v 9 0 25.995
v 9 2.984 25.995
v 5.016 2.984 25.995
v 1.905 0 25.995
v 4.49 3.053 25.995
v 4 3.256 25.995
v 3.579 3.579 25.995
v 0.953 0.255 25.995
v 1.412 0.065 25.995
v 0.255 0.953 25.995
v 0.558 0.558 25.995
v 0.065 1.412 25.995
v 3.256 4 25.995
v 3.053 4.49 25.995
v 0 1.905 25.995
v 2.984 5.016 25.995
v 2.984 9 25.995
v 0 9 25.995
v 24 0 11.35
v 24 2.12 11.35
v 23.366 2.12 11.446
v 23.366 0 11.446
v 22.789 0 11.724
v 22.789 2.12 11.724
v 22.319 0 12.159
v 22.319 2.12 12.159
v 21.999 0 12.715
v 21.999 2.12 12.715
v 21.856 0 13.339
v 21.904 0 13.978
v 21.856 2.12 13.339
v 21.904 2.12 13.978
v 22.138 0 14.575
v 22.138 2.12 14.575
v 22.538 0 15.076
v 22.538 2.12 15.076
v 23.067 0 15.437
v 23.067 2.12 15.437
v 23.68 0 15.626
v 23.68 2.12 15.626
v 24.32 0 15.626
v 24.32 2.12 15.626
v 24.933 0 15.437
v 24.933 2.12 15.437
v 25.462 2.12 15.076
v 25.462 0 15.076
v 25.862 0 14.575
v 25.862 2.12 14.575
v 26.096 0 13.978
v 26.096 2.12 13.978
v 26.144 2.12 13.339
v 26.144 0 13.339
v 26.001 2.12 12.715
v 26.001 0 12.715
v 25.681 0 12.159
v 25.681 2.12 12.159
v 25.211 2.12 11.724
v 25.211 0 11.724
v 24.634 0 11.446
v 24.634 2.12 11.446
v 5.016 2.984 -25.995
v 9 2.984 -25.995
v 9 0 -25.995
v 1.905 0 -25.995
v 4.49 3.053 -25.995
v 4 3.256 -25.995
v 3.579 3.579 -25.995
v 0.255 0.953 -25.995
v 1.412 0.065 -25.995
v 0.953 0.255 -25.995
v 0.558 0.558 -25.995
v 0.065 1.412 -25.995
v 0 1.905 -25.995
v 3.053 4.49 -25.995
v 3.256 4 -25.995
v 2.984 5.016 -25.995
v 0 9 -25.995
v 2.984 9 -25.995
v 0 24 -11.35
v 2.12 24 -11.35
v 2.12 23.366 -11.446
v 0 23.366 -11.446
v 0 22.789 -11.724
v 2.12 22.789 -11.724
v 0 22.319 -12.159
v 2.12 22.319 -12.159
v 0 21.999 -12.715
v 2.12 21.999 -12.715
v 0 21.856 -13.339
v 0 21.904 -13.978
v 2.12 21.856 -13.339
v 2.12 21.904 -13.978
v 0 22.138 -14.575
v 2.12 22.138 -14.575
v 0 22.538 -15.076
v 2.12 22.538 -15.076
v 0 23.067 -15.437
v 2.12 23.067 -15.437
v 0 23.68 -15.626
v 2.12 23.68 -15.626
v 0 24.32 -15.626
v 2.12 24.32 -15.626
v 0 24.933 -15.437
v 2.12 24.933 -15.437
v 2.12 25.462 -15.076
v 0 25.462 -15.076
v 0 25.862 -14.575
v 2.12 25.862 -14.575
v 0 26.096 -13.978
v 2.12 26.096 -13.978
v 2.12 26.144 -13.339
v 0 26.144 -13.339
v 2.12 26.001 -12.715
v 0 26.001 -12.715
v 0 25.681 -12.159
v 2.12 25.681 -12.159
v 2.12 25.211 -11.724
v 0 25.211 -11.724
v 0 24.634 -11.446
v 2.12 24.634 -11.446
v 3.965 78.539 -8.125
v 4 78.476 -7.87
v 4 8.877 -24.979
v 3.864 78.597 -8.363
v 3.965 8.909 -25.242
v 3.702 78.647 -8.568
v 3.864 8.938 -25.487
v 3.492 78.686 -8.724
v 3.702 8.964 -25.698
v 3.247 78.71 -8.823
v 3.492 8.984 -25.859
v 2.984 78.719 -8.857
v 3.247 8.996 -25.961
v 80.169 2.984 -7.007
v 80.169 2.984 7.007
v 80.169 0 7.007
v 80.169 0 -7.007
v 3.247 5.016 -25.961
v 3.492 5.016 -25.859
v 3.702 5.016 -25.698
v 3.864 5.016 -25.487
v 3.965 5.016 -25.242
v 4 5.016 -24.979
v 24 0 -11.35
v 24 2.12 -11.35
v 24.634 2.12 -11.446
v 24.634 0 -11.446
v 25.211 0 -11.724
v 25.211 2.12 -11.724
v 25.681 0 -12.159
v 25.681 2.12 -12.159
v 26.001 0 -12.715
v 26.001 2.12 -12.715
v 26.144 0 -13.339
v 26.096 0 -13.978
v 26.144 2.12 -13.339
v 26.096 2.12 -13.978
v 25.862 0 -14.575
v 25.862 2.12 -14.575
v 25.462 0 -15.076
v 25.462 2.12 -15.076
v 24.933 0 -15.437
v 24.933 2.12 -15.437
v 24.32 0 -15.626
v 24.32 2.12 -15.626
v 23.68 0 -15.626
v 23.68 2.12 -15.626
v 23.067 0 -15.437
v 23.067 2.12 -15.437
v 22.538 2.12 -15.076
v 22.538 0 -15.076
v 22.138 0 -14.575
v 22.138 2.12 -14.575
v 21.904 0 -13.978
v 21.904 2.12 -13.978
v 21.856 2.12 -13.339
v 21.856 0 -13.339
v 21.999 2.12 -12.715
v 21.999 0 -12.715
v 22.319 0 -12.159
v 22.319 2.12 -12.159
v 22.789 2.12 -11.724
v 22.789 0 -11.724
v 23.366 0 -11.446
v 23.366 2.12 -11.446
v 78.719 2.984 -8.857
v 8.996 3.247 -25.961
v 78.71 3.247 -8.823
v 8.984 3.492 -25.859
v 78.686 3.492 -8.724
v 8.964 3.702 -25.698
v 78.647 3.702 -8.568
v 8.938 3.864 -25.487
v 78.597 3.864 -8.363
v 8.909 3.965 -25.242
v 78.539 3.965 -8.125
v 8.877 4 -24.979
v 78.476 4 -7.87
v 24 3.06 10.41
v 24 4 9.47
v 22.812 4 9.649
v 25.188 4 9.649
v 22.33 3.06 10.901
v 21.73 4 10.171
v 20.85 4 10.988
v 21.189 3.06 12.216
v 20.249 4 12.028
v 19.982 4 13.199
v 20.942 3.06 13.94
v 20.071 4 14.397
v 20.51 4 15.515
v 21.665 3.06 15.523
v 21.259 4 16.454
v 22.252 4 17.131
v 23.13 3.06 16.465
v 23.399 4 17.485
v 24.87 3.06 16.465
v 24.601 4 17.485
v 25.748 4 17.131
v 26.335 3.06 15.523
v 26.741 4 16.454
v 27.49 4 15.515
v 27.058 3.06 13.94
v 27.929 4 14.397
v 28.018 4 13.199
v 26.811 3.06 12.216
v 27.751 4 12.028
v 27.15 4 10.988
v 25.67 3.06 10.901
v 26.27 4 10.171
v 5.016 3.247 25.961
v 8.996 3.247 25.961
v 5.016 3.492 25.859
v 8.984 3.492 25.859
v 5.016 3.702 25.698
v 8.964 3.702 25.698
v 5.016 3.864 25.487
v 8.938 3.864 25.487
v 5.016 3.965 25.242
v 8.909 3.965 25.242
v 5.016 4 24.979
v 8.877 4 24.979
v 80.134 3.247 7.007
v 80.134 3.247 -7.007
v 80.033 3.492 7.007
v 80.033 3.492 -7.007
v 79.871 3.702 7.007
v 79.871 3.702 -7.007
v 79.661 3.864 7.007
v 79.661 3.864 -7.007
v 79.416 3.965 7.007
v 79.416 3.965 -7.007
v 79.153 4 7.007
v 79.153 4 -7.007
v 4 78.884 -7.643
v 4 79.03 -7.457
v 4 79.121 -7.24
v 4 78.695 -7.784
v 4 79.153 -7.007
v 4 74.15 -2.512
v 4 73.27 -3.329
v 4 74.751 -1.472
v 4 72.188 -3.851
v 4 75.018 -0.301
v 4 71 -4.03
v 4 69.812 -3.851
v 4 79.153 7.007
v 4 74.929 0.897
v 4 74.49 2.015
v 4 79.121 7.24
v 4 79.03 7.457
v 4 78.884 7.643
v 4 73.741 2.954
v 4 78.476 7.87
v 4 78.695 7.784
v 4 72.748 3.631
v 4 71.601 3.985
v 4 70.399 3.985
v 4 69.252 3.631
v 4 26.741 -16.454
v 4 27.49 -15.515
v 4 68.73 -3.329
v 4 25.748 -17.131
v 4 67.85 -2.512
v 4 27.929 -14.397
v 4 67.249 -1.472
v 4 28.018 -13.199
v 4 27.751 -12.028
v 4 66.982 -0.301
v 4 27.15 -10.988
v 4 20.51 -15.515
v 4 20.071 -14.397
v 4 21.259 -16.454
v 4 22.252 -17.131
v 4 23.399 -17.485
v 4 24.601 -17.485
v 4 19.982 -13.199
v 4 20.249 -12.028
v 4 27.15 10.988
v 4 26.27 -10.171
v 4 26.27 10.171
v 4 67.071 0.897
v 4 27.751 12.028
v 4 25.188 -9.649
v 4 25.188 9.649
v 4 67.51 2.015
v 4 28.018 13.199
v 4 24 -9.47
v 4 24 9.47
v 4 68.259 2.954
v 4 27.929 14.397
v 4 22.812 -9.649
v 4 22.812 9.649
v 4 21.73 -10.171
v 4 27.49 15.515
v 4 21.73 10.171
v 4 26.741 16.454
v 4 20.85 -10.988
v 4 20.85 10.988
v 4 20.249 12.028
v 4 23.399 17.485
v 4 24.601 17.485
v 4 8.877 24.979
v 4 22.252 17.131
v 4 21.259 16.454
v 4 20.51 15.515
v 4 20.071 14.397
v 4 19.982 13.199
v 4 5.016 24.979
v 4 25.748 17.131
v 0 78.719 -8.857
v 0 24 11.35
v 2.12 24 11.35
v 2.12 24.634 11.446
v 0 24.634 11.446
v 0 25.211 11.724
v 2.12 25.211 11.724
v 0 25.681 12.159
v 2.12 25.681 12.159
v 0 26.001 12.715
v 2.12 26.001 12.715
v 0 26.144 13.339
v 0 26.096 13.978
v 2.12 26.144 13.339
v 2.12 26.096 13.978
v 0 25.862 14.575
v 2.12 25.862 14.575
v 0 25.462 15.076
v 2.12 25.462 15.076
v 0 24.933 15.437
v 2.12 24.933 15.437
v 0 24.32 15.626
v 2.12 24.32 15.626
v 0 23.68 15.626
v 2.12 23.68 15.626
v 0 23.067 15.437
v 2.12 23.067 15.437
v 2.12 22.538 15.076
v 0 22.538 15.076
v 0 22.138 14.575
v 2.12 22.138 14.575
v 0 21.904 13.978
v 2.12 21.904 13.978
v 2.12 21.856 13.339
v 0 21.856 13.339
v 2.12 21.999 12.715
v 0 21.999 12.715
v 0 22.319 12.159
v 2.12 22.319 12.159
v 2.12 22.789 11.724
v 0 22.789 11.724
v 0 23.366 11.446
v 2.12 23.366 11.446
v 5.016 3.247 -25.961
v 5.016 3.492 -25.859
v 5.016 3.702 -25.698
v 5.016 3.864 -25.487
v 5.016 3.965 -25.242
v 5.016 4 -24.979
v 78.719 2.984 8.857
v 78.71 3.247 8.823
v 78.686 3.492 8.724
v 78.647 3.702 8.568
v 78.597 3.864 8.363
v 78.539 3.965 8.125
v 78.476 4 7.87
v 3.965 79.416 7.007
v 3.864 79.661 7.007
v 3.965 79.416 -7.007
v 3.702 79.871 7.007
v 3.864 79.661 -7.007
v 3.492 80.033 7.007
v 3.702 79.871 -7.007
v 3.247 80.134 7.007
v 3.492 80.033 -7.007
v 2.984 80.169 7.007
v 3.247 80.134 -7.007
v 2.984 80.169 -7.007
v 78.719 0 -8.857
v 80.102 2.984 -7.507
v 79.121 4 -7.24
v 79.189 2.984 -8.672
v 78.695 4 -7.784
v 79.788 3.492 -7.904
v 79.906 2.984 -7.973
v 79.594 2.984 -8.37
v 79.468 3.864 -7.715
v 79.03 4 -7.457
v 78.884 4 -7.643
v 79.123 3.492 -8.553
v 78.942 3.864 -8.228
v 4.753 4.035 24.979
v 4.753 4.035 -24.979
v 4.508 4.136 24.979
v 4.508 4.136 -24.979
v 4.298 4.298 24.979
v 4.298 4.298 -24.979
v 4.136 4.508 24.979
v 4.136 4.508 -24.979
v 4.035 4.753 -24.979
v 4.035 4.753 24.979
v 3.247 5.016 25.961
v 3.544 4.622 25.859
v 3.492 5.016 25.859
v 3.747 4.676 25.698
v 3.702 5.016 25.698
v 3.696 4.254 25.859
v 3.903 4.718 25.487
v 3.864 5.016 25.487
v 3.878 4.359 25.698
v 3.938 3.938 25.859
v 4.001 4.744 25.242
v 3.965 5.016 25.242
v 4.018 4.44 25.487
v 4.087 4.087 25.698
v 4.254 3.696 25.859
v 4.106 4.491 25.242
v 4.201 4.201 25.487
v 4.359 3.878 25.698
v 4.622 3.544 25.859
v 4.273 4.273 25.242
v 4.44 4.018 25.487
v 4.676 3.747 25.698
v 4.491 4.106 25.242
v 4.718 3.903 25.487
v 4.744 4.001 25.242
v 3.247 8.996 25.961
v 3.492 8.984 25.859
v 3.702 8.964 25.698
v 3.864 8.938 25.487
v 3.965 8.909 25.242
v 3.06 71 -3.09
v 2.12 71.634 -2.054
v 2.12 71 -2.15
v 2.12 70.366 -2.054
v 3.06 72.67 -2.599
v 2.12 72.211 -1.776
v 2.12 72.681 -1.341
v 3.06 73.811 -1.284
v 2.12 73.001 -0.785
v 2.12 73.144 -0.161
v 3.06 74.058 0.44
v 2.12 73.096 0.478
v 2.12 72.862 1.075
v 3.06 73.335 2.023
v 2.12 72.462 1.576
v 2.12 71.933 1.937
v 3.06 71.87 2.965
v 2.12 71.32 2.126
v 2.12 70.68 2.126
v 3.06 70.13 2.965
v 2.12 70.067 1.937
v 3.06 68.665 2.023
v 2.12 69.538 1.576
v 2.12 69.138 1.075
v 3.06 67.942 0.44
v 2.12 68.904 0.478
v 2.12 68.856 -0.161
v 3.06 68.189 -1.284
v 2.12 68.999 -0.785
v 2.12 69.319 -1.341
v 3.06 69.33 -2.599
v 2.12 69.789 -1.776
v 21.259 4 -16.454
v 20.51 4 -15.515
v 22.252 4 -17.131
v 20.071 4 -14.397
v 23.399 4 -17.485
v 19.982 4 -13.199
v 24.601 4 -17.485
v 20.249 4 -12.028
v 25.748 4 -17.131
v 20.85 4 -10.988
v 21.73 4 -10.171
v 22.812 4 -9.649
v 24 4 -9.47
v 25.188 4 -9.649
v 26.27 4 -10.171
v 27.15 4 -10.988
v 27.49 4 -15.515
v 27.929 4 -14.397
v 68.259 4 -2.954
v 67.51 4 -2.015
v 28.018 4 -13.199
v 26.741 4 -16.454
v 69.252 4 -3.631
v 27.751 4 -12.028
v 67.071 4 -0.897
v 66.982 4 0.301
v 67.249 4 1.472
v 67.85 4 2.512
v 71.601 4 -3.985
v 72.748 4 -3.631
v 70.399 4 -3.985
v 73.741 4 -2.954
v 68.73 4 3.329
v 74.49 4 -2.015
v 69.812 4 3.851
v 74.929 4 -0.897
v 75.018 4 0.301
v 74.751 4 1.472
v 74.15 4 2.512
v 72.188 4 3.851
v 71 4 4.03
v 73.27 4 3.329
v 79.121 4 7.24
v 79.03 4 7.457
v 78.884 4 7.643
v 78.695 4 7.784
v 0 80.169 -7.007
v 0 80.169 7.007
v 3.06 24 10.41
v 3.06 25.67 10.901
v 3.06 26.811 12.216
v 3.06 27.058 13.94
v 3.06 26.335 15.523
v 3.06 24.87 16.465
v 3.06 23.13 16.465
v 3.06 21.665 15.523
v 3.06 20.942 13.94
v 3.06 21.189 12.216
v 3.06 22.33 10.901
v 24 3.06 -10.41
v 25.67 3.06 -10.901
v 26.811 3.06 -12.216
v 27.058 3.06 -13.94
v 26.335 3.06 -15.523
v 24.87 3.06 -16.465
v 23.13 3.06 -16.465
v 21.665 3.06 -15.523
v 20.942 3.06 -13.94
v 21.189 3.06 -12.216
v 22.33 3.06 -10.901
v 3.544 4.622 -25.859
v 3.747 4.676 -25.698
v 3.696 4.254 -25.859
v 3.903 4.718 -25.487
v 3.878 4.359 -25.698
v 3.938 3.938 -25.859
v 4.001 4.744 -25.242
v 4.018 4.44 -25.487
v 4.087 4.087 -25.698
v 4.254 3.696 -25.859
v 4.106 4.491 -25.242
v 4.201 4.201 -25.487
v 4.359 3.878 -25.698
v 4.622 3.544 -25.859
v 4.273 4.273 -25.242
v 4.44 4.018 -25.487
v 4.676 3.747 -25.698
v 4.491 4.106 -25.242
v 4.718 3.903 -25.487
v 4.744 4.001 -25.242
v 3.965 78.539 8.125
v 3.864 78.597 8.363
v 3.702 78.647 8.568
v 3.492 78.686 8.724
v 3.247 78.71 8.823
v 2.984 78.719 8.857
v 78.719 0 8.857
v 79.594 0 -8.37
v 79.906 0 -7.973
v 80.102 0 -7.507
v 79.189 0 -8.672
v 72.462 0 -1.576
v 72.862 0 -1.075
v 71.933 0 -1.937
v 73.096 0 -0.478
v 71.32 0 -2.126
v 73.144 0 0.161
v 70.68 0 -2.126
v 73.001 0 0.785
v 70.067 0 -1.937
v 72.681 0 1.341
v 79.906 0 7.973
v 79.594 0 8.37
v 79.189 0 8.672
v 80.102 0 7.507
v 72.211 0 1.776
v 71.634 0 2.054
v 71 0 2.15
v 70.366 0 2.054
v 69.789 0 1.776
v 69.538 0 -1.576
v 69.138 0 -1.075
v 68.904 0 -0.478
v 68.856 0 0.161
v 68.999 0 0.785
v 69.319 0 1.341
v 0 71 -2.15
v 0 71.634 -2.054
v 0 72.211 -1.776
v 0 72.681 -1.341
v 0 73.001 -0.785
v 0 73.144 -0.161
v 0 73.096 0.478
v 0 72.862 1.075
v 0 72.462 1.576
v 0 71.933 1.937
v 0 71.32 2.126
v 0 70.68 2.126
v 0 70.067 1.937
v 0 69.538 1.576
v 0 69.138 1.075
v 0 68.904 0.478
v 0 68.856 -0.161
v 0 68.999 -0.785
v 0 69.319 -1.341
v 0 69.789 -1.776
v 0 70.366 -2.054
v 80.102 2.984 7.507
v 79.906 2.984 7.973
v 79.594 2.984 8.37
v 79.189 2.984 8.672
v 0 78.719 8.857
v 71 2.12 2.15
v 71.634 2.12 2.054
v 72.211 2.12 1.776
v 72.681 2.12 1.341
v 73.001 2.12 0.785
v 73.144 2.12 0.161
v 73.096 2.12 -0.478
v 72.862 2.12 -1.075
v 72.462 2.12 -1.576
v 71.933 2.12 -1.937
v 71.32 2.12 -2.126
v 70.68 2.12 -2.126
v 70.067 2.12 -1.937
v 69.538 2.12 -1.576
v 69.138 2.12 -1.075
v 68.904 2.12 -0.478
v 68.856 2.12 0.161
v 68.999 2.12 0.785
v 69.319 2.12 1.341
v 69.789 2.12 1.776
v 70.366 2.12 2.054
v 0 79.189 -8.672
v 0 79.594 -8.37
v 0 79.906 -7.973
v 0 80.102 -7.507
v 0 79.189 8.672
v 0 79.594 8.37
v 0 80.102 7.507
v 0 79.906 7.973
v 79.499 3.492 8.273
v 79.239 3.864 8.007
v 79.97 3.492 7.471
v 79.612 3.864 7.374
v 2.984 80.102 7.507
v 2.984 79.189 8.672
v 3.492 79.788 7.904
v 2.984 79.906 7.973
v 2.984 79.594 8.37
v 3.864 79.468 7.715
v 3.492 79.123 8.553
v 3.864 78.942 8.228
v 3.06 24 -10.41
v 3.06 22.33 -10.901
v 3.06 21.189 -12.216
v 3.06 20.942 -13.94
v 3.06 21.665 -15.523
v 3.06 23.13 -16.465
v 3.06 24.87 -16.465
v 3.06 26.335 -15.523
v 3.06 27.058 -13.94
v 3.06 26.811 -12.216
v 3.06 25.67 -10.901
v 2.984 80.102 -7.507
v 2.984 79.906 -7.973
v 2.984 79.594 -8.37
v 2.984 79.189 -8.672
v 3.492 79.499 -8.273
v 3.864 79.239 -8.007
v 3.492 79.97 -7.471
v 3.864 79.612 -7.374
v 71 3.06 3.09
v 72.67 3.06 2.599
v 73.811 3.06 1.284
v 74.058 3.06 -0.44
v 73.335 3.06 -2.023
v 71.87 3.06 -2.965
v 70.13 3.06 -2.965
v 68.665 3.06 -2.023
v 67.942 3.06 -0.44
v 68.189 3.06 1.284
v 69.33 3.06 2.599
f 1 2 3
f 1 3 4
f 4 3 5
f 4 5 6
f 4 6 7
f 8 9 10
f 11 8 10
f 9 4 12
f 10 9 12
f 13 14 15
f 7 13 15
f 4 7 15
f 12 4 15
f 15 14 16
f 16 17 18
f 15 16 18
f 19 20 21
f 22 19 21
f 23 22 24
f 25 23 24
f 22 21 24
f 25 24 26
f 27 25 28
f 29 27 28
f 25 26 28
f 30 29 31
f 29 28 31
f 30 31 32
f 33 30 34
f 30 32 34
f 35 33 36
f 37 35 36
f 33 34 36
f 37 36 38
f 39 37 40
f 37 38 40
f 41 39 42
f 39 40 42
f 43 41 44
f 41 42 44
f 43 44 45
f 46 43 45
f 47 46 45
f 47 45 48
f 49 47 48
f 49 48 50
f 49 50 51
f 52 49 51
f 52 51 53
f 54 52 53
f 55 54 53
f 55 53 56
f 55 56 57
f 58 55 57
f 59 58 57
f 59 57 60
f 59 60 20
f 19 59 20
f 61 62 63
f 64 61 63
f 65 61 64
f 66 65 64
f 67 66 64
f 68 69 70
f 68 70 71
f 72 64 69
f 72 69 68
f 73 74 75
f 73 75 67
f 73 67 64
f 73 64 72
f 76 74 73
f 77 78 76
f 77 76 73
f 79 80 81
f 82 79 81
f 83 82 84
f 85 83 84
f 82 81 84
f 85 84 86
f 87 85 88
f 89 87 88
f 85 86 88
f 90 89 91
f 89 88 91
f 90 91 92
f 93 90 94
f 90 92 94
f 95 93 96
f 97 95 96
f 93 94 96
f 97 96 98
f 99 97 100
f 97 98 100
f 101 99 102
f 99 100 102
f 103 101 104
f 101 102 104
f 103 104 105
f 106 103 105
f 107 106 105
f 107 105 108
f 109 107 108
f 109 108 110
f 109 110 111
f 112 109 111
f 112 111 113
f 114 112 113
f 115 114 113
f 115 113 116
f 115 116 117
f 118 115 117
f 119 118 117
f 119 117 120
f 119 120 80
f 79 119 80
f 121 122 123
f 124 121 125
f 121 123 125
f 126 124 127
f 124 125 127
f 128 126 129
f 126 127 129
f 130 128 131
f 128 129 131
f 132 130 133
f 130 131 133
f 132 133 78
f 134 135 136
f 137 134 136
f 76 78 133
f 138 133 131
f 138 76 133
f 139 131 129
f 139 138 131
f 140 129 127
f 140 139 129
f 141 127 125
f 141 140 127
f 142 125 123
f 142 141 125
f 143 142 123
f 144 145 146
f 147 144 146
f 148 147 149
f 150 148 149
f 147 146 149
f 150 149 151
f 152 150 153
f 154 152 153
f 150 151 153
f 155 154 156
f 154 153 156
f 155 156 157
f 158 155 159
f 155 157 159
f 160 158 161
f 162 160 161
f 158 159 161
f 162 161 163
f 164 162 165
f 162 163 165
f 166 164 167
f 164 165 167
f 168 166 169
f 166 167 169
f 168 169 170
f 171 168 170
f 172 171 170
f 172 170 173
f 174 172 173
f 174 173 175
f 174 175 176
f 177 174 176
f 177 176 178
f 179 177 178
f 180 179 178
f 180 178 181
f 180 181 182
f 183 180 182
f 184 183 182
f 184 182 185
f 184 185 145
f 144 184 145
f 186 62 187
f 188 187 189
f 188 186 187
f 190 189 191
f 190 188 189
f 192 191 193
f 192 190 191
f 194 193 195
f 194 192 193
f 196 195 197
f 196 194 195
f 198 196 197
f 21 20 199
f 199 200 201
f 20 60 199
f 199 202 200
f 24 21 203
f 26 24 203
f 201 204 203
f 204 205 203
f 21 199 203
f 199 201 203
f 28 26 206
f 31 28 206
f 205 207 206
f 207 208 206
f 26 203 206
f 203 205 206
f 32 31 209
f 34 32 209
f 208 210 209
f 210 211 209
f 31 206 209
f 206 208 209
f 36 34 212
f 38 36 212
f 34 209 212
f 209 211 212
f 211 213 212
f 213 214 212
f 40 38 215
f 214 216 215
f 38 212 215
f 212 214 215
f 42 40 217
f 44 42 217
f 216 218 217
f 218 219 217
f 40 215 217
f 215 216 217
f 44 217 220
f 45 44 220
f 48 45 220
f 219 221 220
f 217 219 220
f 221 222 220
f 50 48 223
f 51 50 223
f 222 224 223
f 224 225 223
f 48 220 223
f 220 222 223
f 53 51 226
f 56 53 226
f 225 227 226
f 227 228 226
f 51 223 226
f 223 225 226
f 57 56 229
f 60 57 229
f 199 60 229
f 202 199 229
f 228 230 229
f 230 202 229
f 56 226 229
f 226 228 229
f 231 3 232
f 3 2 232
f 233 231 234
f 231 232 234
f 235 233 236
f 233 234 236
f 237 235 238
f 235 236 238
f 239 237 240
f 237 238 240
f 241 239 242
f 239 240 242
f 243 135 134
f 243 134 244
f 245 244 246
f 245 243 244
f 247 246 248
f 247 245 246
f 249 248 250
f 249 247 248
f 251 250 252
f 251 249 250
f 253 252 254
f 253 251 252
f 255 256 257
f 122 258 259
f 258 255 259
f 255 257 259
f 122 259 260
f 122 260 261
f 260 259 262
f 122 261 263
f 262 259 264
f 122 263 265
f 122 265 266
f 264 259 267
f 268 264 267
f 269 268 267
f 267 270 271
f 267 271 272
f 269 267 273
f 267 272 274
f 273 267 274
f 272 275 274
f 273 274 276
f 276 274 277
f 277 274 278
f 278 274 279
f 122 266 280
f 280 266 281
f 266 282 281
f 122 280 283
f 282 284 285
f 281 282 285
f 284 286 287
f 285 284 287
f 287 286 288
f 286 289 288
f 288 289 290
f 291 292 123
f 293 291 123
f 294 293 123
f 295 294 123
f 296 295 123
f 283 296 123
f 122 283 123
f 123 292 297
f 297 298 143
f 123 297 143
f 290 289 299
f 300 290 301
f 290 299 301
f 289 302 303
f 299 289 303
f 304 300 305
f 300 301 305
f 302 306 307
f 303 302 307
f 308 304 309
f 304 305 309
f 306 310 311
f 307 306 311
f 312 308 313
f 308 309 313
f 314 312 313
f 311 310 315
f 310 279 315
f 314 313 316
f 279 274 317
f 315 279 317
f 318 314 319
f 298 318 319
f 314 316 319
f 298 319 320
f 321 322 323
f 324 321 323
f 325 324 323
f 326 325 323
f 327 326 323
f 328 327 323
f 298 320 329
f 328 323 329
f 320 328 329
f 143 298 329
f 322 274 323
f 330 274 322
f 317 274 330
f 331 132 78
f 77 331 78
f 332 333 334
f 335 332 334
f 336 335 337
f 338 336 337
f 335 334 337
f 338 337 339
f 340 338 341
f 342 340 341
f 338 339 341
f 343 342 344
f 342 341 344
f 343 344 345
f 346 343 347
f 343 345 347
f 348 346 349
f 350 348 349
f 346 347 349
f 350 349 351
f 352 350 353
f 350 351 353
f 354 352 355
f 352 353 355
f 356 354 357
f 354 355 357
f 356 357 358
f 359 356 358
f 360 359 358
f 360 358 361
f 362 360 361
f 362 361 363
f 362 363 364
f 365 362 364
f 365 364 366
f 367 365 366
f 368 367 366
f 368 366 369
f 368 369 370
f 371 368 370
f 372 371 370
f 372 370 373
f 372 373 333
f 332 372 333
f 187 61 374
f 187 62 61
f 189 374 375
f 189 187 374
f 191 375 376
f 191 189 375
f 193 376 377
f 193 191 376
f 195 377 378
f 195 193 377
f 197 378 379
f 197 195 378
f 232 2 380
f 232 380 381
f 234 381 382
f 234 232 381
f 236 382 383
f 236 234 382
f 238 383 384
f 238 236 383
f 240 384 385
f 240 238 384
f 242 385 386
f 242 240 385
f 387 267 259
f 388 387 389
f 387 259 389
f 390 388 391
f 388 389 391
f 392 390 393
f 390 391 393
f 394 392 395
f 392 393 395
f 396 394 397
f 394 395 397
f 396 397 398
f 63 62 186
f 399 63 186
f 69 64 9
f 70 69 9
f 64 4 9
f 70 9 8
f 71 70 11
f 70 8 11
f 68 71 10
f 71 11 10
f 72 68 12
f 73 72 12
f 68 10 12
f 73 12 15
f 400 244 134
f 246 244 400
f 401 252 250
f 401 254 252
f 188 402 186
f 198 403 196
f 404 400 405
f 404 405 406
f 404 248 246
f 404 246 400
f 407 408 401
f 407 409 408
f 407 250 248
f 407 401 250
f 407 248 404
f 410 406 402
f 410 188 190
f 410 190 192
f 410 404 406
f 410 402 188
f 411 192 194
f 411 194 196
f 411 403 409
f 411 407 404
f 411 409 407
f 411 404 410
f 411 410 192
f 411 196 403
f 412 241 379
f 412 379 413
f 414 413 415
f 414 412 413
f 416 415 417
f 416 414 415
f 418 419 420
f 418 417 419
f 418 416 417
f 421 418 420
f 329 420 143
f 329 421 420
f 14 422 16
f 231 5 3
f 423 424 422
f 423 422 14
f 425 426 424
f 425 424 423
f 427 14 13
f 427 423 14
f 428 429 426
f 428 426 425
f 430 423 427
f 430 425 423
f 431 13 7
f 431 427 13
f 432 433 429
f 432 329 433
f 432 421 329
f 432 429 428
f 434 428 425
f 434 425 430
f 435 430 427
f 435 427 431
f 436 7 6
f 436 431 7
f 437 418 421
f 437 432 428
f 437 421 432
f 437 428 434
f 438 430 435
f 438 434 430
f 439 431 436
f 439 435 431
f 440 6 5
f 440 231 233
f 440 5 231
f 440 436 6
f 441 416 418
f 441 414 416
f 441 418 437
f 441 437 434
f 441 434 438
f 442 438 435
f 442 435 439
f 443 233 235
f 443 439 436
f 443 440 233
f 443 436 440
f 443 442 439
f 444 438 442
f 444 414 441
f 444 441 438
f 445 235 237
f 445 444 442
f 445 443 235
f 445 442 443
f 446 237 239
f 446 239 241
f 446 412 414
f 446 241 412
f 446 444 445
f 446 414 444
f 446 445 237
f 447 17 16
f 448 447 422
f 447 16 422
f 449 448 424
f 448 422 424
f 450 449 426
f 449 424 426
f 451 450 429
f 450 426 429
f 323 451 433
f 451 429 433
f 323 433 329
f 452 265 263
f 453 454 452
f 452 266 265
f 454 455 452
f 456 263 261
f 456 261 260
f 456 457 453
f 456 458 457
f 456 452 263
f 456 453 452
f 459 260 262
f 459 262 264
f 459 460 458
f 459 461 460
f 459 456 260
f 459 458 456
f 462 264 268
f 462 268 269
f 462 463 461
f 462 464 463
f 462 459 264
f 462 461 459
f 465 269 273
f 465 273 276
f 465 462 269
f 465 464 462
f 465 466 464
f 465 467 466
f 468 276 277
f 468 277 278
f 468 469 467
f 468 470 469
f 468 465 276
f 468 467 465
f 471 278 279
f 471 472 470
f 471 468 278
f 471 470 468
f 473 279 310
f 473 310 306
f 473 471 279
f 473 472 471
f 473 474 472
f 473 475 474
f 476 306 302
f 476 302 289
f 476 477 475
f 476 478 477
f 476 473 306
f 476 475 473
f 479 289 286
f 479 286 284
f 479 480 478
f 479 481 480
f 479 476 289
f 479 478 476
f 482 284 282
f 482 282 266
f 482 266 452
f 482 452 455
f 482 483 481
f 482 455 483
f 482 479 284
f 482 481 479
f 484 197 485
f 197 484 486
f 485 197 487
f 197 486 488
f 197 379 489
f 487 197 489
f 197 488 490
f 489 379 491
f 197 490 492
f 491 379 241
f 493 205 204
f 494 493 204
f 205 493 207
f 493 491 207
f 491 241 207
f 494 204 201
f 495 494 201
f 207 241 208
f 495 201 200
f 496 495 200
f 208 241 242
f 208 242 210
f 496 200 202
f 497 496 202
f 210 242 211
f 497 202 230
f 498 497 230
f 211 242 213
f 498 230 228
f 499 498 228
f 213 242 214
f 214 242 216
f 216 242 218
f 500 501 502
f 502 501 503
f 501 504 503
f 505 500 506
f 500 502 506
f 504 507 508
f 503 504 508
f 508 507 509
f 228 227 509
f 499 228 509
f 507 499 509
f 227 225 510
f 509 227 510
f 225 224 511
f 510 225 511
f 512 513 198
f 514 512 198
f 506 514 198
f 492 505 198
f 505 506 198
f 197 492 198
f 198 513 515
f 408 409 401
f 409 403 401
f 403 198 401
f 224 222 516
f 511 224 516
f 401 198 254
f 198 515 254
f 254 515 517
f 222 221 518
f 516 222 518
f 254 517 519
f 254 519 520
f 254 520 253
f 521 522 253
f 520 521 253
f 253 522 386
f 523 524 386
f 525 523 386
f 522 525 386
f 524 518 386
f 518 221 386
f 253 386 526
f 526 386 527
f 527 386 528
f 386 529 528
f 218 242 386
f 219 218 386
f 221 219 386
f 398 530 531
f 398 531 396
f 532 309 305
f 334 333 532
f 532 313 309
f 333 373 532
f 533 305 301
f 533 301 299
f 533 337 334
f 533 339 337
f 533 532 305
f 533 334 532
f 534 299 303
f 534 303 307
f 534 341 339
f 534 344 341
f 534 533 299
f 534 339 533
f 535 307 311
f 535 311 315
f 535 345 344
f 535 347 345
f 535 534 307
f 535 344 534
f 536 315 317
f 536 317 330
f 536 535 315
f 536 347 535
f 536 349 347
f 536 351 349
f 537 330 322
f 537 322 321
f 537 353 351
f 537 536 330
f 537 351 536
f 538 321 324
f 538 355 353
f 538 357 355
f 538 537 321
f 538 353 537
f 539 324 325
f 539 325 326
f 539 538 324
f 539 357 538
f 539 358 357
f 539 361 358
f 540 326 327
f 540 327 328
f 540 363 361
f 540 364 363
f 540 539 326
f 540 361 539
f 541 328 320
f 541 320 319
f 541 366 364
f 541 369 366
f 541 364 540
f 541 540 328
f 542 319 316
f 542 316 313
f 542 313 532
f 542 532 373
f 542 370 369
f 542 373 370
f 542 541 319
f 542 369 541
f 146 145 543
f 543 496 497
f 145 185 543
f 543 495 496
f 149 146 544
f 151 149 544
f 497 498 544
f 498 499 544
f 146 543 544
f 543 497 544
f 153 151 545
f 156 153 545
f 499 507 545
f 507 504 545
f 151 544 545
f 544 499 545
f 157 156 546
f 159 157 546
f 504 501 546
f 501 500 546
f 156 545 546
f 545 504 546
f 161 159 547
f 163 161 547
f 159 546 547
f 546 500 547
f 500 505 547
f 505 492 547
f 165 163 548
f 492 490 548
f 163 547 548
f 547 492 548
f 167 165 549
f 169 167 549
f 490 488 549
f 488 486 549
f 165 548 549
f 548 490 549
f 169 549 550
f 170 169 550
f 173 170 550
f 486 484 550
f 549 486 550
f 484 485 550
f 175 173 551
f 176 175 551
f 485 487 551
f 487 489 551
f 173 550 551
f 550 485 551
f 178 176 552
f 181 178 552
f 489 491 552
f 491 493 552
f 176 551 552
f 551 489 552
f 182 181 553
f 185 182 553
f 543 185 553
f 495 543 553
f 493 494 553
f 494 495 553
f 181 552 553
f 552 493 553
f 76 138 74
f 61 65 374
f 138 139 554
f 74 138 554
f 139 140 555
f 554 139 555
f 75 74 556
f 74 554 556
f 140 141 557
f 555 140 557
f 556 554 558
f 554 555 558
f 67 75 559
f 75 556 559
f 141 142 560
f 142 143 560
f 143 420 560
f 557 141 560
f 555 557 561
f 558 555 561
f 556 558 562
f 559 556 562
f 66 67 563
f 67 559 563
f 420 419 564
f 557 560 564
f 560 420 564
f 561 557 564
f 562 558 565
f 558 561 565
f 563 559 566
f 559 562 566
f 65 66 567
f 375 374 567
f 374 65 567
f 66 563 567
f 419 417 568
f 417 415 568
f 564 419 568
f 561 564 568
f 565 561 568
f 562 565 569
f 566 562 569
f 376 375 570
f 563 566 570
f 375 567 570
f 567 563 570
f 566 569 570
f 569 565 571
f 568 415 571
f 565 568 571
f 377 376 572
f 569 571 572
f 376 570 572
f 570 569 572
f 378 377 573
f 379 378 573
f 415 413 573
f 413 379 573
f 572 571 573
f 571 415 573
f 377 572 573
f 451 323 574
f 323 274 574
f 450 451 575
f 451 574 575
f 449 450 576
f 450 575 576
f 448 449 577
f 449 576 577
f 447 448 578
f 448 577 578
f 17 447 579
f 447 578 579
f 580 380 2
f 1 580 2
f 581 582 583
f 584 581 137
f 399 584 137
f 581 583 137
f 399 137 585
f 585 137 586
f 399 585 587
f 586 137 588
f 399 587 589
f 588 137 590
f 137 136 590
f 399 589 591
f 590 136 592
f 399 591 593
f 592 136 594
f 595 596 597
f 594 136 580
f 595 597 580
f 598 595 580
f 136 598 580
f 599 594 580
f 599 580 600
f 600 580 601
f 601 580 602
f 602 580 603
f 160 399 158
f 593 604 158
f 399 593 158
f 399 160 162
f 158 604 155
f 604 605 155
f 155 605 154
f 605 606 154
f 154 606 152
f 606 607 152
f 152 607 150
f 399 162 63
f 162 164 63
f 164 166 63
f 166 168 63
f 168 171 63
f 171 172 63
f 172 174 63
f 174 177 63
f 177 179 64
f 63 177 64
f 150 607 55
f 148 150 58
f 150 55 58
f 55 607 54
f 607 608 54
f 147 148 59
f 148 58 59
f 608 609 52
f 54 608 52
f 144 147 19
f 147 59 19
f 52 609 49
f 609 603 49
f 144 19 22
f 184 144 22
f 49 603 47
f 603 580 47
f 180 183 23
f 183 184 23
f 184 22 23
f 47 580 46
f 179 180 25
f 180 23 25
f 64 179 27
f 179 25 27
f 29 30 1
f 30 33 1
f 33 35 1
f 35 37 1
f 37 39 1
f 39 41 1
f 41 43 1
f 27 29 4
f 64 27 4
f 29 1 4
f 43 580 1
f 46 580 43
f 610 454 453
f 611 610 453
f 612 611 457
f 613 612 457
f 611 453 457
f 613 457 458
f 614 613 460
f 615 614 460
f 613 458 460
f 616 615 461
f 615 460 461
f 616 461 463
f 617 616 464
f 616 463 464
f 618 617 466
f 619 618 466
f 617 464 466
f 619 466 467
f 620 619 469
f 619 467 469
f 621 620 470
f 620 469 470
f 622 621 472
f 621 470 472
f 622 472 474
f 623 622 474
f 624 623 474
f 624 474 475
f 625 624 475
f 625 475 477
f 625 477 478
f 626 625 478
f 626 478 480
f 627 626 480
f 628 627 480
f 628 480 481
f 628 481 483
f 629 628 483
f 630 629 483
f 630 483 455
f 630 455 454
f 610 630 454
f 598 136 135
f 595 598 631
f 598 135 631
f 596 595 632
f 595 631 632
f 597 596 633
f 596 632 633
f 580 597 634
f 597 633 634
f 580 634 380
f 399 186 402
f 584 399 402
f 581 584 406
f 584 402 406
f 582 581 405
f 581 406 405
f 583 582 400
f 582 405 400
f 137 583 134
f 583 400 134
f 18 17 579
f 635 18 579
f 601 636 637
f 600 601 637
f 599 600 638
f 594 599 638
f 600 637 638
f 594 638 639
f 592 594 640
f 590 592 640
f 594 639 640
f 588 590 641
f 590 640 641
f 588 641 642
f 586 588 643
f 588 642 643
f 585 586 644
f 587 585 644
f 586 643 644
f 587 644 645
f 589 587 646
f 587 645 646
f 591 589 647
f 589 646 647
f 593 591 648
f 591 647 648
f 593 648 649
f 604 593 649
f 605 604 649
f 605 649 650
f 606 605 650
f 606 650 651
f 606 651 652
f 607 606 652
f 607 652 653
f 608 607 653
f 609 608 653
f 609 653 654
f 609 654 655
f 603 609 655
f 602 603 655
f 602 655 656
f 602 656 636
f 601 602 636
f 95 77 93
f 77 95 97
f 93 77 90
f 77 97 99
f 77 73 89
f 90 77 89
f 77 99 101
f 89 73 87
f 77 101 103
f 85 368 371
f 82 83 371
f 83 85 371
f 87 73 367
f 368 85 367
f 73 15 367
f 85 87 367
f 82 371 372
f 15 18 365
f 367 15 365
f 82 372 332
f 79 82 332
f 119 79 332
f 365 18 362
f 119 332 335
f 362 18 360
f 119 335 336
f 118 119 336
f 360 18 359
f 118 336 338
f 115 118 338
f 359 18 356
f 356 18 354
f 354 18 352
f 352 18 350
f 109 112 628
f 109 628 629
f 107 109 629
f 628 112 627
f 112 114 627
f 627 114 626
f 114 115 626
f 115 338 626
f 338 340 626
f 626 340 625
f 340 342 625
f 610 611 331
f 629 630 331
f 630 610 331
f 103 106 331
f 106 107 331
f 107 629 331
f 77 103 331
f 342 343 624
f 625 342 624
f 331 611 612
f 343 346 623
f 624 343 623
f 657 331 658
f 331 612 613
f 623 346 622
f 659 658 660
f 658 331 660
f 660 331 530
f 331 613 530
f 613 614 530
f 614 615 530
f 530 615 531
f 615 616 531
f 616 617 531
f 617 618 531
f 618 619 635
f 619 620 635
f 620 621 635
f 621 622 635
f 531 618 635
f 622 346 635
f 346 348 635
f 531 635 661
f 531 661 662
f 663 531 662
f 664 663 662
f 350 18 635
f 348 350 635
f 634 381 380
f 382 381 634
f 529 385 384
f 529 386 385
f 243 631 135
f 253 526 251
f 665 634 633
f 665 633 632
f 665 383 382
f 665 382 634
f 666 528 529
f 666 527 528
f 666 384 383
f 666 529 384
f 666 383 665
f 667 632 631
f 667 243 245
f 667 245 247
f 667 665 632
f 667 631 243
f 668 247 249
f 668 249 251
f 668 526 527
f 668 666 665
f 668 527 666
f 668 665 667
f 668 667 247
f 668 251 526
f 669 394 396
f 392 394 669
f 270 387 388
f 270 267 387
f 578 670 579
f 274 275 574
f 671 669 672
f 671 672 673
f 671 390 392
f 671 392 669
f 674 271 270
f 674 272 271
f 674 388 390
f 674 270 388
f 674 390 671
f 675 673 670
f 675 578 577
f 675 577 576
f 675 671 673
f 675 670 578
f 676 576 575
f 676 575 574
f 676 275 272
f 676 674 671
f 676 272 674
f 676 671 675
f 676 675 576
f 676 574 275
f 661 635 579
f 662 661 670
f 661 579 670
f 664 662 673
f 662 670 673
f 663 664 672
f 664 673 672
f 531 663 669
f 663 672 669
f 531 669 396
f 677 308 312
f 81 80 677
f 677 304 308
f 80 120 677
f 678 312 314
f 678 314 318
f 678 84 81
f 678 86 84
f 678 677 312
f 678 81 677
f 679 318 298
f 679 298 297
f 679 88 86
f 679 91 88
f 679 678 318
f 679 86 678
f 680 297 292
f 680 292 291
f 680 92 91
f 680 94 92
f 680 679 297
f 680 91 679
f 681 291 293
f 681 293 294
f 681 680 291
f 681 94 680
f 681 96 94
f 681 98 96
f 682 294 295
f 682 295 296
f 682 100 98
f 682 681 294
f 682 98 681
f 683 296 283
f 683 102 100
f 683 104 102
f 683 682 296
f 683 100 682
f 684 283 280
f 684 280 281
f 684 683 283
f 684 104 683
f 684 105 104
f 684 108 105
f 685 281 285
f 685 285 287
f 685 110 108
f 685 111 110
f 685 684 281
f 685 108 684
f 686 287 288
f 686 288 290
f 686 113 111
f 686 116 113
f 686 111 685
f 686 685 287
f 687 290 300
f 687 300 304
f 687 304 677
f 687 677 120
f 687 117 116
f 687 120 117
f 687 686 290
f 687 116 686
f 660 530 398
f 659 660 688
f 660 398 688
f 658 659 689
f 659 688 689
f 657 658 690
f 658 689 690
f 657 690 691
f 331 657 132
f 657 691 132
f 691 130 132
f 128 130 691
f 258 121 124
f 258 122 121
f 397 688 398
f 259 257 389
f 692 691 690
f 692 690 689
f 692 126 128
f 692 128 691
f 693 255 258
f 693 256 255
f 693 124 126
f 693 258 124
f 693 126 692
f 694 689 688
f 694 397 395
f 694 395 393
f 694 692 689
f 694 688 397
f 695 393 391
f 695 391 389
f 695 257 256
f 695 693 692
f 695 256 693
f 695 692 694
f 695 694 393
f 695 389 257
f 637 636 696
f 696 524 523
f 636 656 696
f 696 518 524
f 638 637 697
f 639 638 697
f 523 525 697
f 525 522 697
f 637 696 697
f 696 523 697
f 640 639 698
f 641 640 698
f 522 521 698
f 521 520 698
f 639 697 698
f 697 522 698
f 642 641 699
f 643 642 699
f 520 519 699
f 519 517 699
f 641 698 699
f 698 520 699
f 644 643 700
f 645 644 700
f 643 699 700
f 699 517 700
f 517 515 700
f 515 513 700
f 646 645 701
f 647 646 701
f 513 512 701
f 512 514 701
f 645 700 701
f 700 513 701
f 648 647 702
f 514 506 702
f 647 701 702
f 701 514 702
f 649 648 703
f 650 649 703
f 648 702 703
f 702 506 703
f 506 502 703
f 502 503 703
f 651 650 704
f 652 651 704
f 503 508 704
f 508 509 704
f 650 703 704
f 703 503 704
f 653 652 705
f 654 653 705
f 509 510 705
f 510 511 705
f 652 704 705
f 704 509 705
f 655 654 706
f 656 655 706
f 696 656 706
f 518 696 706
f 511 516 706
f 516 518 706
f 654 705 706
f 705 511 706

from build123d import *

# Parameters (mm, degrees)
EXTRUDE_THIN2_DEPTH = 25.9953125
CUT_EXTRUDE1_DEPTH  = 114.59781347
CUT_EXTRUDE2_DEPTH  = 114.59781347
SKETCH5_R           = 2.15
CUT_EXTRUDE4_DEPTH  = 114.59781347
SKETCH4_R           = 2.15
CUT_EXTRUDE3_DEPTH  = 114.59781347
FILLET1_R           = 1.016
FILLET2_R           = 1.905
CHAMFER1_SIZE       = 1.8796


with BuildPart() as part:
    # Sketch1 → Extrude-Thin2 (new, symmetric)
    with BuildSketch(Plane.XY):
        with BuildLine():
            Line((80.16875, 0), (1.905, 0))
            ThreePointArc((1.905, 0), (0.557961582, 0.557961582), (0, 1.905))
            Line((0, 1.905), (0, 80.16875))
            Line((0, 80.16875), (4, 80.16875))
            Line((4, 80.16875), (4, 4))
            Line((4, 4), (80.16875, 4))
            Line((80.16875, 4), (80.16875, 0))
        make_face()
    extrude(amount=EXTRUDE_THIN2_DEPTH, both=True)

    # Sketch2 → Cut-Extrude1 (cut, through all)
    with BuildSketch(Plane(origin=(4, 0, 0), x_dir=(0, 0, -1), z_dir=(1, 0, 0))):
        Polygon((-8.5, 80.16875), (8.5, 80.16875), (25.9953125, 9), (38.1, 9), (38.1, 105.56875), (-38.1, 105.56875), (-38.1, 9), (-25.9953125, 9), align=None)
    extrude(amount=-CUT_EXTRUDE1_DEPTH, mode=Mode.SUBTRACT)

    # Sketch3 → Cut-Extrude2 (cut, through all)
    with BuildSketch(Plane(origin=(0, 4, 0), x_dir=(1, 0, 0), z_dir=(0, 1, 0))):
        Polygon((9, 25.9953125), (80.16875, 8.5), (80.16875, -8.5), (9, -25.9953125), (9, -38.1), (105.56875, -38.1), (105.56875, 38.1), (9, 38.1), align=None)
    extrude(amount=-CUT_EXTRUDE2_DEPTH, mode=Mode.SUBTRACT)

    # Sketch5 → Cut-Extrude4 (cut, through all)
    with BuildSketch(Plane(origin=(0, 4, 0), x_dir=(1, 0, 0), z_dir=(0, 1, 0))):
        with Locations(Location((71, 0, 0), (0, 0, 270))):
            Circle(SKETCH5_R)
        with Locations(Location((24, 13.5, 0), (0, 0, 270))):
            Circle(SKETCH5_R)
        with Locations(Location((24, -13.5, 0), (0, 0, 90))):
            Circle(SKETCH5_R)
    extrude(amount=-CUT_EXTRUDE4_DEPTH, mode=Mode.SUBTRACT)

    # Sketch4 → Cut-Extrude3 (cut, through all)
    with BuildSketch(Plane(origin=(4, 0, 0), x_dir=(0, 0, -1), z_dir=(1, 0, 0))):
        with Locations((0, 71)):
            Circle(SKETCH4_R)
        with Locations((-13.5, 24)):
            Circle(SKETCH4_R)
        with Locations(Location((13.5, 24, 0), (0, 0, 180))):
            Circle(SKETCH4_R)
    extrude(amount=-CUT_EXTRUDE3_DEPTH, mode=Mode.SUBTRACT)

    # Fillet1
    fillet1_edges = [part.edges().sort_by_distance(p)[0] for p in [
        (6.5, 4, 25.9953125),
        (4, 4, 0),
        (4, 6.5, -25.9953125),
        (4, 6.5, 25.9953125),
        (4, 80.16875, 0),
        (4, 44.584375, 17.24765625),
        (4, 44.584375, -17.24765625),
        (80.16875, 4, 0),
        (44.584375, 4, 17.24765625),
        (44.584375, 4, -17.24765625),
        (6.5, 4, -25.9953125),
    ]]
    fillet(fillet1_edges, radius=FILLET1_R)

    # Fillet2
    # the kernel refuses this fillet: 1.905 mm, written as the material it takes off along each edge
    with BuildSketch(Plane(origin=(78.26375, 4, 7.00658656), x_dir=(0.23872121575662697, 0, 0.9710881428313695), z_dir=(-0.9710881428313695, 0, 0.23872121575662697))) as fillet2_piece_1:
        with BuildLine():
            CenterArc((0.889, -1.016), 1.016, 0, 90)
            Line((1.905, -1.016), (1.905, 0))
            Line((1.905, 0), (0.889, 0))
        make_face()
    revolve(axis=Axis((78.26375, 4, 7.00658656), (0, 1, 0)), revolution_arc=76.188922225, mode=Mode.SUBTRACT)
    with BuildSketch(Plane(origin=(4, 78.26375, 7.00658656), x_dir=(0, 1, 0), z_dir=(0, 0, -1))) as fillet2_piece_2:
        with BuildLine():
            CenterArc((0.889, -1.016), 1.016, 0, 90)
            Line((1.905, -1.016), (1.905, 0))
            Line((1.905, 0), (0.889, 0))
        make_face()
    revolve(axis=Axis((4, 78.26375, 7.00658656), (1, 0, 0)), revolution_arc=76.188922225, mode=Mode.SUBTRACT)
    with BuildSketch(Plane(origin=(4, 78.26375, -7.00658656), x_dir=(0, 0.23872121575662691, -0.9710881428313693), z_dir=(0, -0.9710881428313693, -0.23872121575662691))) as fillet2_piece_3:
        with BuildLine():
            CenterArc((0.889, -1.016), 1.016, 0, 90)
            Line((1.905, -1.016), (1.905, 0))
            Line((1.905, 0), (0.889, 0))
        make_face()
    revolve(axis=Axis((4, 78.26375, -7.00658656), (1, 0, 0)), revolution_arc=76.188922225, mode=Mode.SUBTRACT)
    with BuildSketch(Plane(origin=(78.26375, 4, -7.00658656), x_dir=(1, 0, 0), z_dir=(0, 0, 1))) as fillet2_piece_4:
        with BuildLine():
            CenterArc((0.889, -1.016), 1.016, 0, 90)
            Line((1.905, -1.016), (1.905, 0))
            Line((1.905, 0), (0.889, 0))
        make_face()
    revolve(axis=Axis((78.26375, 4, -7.00658656), (0, 1, 0)), revolution_arc=76.188922225, mode=Mode.SUBTRACT)
    with BuildSketch(Plane(origin=(4, 80.16875, 8.5), x_dir=(0, -0.971088142831369, 0.23872121575662839), z_dir=(-1, 0, 0)), Plane(origin=(80.16875, 4, 8.5), x_dir=(0, 0, -1), z_dir=(0, -1, 0))) as fillet2_piece_5:
        with BuildLine():
            CenterArc((FILLET2_R * 0.783944063022, -FILLET2_R), FILLET2_R, 90, 76.188922225)
            Line((-FILLET2_R * 0.18714407981, -FILLET2_R * 0.761278784243), (0, 0))
            Line((0, 0), (FILLET2_R * 0.783944063022, 0))
        make_face()
    extrude(amount=7.7335336, mode=Mode.SUBTRACT)
    with BuildSketch(Plane(origin=(4, 80.16875, -8.5), x_dir=(0, -0.9710881428313692, -0.23872121575662728), z_dir=(-1, 0, 0)), Plane(origin=(80.16875, 4, -8.5), x_dir=(0, 0, 1), z_dir=(0, -1, 0))) as fillet2_piece_6:
        with BuildLine():
            CenterArc((FILLET2_R * 0.783944063022, FILLET2_R), FILLET2_R, 193.811077775, 76.188922225)
            Line((-FILLET2_R * 0.18714407981, FILLET2_R * 0.761278784243), (0, 0))
            Line((0, 0), (FILLET2_R * 0.783944063022, 0))
        make_face()
    extrude(amount=7.7335336, mode=Mode.SUBTRACT)

    # Chamfer1
    chamfer1_edges = [part.edges().sort_by_distance(p)[0] for p in [
        (71, 4, -2.15),
        (24, 4, -15.65),
        (24, 4, 15.65),
        (4, 71, 2.15),
        (4, 24, 15.65),
        (4, 24, -15.65),
    ]]
    chamfer(chamfer1_edges, length=CHAMFER1_SIZE)


solid = part.part
